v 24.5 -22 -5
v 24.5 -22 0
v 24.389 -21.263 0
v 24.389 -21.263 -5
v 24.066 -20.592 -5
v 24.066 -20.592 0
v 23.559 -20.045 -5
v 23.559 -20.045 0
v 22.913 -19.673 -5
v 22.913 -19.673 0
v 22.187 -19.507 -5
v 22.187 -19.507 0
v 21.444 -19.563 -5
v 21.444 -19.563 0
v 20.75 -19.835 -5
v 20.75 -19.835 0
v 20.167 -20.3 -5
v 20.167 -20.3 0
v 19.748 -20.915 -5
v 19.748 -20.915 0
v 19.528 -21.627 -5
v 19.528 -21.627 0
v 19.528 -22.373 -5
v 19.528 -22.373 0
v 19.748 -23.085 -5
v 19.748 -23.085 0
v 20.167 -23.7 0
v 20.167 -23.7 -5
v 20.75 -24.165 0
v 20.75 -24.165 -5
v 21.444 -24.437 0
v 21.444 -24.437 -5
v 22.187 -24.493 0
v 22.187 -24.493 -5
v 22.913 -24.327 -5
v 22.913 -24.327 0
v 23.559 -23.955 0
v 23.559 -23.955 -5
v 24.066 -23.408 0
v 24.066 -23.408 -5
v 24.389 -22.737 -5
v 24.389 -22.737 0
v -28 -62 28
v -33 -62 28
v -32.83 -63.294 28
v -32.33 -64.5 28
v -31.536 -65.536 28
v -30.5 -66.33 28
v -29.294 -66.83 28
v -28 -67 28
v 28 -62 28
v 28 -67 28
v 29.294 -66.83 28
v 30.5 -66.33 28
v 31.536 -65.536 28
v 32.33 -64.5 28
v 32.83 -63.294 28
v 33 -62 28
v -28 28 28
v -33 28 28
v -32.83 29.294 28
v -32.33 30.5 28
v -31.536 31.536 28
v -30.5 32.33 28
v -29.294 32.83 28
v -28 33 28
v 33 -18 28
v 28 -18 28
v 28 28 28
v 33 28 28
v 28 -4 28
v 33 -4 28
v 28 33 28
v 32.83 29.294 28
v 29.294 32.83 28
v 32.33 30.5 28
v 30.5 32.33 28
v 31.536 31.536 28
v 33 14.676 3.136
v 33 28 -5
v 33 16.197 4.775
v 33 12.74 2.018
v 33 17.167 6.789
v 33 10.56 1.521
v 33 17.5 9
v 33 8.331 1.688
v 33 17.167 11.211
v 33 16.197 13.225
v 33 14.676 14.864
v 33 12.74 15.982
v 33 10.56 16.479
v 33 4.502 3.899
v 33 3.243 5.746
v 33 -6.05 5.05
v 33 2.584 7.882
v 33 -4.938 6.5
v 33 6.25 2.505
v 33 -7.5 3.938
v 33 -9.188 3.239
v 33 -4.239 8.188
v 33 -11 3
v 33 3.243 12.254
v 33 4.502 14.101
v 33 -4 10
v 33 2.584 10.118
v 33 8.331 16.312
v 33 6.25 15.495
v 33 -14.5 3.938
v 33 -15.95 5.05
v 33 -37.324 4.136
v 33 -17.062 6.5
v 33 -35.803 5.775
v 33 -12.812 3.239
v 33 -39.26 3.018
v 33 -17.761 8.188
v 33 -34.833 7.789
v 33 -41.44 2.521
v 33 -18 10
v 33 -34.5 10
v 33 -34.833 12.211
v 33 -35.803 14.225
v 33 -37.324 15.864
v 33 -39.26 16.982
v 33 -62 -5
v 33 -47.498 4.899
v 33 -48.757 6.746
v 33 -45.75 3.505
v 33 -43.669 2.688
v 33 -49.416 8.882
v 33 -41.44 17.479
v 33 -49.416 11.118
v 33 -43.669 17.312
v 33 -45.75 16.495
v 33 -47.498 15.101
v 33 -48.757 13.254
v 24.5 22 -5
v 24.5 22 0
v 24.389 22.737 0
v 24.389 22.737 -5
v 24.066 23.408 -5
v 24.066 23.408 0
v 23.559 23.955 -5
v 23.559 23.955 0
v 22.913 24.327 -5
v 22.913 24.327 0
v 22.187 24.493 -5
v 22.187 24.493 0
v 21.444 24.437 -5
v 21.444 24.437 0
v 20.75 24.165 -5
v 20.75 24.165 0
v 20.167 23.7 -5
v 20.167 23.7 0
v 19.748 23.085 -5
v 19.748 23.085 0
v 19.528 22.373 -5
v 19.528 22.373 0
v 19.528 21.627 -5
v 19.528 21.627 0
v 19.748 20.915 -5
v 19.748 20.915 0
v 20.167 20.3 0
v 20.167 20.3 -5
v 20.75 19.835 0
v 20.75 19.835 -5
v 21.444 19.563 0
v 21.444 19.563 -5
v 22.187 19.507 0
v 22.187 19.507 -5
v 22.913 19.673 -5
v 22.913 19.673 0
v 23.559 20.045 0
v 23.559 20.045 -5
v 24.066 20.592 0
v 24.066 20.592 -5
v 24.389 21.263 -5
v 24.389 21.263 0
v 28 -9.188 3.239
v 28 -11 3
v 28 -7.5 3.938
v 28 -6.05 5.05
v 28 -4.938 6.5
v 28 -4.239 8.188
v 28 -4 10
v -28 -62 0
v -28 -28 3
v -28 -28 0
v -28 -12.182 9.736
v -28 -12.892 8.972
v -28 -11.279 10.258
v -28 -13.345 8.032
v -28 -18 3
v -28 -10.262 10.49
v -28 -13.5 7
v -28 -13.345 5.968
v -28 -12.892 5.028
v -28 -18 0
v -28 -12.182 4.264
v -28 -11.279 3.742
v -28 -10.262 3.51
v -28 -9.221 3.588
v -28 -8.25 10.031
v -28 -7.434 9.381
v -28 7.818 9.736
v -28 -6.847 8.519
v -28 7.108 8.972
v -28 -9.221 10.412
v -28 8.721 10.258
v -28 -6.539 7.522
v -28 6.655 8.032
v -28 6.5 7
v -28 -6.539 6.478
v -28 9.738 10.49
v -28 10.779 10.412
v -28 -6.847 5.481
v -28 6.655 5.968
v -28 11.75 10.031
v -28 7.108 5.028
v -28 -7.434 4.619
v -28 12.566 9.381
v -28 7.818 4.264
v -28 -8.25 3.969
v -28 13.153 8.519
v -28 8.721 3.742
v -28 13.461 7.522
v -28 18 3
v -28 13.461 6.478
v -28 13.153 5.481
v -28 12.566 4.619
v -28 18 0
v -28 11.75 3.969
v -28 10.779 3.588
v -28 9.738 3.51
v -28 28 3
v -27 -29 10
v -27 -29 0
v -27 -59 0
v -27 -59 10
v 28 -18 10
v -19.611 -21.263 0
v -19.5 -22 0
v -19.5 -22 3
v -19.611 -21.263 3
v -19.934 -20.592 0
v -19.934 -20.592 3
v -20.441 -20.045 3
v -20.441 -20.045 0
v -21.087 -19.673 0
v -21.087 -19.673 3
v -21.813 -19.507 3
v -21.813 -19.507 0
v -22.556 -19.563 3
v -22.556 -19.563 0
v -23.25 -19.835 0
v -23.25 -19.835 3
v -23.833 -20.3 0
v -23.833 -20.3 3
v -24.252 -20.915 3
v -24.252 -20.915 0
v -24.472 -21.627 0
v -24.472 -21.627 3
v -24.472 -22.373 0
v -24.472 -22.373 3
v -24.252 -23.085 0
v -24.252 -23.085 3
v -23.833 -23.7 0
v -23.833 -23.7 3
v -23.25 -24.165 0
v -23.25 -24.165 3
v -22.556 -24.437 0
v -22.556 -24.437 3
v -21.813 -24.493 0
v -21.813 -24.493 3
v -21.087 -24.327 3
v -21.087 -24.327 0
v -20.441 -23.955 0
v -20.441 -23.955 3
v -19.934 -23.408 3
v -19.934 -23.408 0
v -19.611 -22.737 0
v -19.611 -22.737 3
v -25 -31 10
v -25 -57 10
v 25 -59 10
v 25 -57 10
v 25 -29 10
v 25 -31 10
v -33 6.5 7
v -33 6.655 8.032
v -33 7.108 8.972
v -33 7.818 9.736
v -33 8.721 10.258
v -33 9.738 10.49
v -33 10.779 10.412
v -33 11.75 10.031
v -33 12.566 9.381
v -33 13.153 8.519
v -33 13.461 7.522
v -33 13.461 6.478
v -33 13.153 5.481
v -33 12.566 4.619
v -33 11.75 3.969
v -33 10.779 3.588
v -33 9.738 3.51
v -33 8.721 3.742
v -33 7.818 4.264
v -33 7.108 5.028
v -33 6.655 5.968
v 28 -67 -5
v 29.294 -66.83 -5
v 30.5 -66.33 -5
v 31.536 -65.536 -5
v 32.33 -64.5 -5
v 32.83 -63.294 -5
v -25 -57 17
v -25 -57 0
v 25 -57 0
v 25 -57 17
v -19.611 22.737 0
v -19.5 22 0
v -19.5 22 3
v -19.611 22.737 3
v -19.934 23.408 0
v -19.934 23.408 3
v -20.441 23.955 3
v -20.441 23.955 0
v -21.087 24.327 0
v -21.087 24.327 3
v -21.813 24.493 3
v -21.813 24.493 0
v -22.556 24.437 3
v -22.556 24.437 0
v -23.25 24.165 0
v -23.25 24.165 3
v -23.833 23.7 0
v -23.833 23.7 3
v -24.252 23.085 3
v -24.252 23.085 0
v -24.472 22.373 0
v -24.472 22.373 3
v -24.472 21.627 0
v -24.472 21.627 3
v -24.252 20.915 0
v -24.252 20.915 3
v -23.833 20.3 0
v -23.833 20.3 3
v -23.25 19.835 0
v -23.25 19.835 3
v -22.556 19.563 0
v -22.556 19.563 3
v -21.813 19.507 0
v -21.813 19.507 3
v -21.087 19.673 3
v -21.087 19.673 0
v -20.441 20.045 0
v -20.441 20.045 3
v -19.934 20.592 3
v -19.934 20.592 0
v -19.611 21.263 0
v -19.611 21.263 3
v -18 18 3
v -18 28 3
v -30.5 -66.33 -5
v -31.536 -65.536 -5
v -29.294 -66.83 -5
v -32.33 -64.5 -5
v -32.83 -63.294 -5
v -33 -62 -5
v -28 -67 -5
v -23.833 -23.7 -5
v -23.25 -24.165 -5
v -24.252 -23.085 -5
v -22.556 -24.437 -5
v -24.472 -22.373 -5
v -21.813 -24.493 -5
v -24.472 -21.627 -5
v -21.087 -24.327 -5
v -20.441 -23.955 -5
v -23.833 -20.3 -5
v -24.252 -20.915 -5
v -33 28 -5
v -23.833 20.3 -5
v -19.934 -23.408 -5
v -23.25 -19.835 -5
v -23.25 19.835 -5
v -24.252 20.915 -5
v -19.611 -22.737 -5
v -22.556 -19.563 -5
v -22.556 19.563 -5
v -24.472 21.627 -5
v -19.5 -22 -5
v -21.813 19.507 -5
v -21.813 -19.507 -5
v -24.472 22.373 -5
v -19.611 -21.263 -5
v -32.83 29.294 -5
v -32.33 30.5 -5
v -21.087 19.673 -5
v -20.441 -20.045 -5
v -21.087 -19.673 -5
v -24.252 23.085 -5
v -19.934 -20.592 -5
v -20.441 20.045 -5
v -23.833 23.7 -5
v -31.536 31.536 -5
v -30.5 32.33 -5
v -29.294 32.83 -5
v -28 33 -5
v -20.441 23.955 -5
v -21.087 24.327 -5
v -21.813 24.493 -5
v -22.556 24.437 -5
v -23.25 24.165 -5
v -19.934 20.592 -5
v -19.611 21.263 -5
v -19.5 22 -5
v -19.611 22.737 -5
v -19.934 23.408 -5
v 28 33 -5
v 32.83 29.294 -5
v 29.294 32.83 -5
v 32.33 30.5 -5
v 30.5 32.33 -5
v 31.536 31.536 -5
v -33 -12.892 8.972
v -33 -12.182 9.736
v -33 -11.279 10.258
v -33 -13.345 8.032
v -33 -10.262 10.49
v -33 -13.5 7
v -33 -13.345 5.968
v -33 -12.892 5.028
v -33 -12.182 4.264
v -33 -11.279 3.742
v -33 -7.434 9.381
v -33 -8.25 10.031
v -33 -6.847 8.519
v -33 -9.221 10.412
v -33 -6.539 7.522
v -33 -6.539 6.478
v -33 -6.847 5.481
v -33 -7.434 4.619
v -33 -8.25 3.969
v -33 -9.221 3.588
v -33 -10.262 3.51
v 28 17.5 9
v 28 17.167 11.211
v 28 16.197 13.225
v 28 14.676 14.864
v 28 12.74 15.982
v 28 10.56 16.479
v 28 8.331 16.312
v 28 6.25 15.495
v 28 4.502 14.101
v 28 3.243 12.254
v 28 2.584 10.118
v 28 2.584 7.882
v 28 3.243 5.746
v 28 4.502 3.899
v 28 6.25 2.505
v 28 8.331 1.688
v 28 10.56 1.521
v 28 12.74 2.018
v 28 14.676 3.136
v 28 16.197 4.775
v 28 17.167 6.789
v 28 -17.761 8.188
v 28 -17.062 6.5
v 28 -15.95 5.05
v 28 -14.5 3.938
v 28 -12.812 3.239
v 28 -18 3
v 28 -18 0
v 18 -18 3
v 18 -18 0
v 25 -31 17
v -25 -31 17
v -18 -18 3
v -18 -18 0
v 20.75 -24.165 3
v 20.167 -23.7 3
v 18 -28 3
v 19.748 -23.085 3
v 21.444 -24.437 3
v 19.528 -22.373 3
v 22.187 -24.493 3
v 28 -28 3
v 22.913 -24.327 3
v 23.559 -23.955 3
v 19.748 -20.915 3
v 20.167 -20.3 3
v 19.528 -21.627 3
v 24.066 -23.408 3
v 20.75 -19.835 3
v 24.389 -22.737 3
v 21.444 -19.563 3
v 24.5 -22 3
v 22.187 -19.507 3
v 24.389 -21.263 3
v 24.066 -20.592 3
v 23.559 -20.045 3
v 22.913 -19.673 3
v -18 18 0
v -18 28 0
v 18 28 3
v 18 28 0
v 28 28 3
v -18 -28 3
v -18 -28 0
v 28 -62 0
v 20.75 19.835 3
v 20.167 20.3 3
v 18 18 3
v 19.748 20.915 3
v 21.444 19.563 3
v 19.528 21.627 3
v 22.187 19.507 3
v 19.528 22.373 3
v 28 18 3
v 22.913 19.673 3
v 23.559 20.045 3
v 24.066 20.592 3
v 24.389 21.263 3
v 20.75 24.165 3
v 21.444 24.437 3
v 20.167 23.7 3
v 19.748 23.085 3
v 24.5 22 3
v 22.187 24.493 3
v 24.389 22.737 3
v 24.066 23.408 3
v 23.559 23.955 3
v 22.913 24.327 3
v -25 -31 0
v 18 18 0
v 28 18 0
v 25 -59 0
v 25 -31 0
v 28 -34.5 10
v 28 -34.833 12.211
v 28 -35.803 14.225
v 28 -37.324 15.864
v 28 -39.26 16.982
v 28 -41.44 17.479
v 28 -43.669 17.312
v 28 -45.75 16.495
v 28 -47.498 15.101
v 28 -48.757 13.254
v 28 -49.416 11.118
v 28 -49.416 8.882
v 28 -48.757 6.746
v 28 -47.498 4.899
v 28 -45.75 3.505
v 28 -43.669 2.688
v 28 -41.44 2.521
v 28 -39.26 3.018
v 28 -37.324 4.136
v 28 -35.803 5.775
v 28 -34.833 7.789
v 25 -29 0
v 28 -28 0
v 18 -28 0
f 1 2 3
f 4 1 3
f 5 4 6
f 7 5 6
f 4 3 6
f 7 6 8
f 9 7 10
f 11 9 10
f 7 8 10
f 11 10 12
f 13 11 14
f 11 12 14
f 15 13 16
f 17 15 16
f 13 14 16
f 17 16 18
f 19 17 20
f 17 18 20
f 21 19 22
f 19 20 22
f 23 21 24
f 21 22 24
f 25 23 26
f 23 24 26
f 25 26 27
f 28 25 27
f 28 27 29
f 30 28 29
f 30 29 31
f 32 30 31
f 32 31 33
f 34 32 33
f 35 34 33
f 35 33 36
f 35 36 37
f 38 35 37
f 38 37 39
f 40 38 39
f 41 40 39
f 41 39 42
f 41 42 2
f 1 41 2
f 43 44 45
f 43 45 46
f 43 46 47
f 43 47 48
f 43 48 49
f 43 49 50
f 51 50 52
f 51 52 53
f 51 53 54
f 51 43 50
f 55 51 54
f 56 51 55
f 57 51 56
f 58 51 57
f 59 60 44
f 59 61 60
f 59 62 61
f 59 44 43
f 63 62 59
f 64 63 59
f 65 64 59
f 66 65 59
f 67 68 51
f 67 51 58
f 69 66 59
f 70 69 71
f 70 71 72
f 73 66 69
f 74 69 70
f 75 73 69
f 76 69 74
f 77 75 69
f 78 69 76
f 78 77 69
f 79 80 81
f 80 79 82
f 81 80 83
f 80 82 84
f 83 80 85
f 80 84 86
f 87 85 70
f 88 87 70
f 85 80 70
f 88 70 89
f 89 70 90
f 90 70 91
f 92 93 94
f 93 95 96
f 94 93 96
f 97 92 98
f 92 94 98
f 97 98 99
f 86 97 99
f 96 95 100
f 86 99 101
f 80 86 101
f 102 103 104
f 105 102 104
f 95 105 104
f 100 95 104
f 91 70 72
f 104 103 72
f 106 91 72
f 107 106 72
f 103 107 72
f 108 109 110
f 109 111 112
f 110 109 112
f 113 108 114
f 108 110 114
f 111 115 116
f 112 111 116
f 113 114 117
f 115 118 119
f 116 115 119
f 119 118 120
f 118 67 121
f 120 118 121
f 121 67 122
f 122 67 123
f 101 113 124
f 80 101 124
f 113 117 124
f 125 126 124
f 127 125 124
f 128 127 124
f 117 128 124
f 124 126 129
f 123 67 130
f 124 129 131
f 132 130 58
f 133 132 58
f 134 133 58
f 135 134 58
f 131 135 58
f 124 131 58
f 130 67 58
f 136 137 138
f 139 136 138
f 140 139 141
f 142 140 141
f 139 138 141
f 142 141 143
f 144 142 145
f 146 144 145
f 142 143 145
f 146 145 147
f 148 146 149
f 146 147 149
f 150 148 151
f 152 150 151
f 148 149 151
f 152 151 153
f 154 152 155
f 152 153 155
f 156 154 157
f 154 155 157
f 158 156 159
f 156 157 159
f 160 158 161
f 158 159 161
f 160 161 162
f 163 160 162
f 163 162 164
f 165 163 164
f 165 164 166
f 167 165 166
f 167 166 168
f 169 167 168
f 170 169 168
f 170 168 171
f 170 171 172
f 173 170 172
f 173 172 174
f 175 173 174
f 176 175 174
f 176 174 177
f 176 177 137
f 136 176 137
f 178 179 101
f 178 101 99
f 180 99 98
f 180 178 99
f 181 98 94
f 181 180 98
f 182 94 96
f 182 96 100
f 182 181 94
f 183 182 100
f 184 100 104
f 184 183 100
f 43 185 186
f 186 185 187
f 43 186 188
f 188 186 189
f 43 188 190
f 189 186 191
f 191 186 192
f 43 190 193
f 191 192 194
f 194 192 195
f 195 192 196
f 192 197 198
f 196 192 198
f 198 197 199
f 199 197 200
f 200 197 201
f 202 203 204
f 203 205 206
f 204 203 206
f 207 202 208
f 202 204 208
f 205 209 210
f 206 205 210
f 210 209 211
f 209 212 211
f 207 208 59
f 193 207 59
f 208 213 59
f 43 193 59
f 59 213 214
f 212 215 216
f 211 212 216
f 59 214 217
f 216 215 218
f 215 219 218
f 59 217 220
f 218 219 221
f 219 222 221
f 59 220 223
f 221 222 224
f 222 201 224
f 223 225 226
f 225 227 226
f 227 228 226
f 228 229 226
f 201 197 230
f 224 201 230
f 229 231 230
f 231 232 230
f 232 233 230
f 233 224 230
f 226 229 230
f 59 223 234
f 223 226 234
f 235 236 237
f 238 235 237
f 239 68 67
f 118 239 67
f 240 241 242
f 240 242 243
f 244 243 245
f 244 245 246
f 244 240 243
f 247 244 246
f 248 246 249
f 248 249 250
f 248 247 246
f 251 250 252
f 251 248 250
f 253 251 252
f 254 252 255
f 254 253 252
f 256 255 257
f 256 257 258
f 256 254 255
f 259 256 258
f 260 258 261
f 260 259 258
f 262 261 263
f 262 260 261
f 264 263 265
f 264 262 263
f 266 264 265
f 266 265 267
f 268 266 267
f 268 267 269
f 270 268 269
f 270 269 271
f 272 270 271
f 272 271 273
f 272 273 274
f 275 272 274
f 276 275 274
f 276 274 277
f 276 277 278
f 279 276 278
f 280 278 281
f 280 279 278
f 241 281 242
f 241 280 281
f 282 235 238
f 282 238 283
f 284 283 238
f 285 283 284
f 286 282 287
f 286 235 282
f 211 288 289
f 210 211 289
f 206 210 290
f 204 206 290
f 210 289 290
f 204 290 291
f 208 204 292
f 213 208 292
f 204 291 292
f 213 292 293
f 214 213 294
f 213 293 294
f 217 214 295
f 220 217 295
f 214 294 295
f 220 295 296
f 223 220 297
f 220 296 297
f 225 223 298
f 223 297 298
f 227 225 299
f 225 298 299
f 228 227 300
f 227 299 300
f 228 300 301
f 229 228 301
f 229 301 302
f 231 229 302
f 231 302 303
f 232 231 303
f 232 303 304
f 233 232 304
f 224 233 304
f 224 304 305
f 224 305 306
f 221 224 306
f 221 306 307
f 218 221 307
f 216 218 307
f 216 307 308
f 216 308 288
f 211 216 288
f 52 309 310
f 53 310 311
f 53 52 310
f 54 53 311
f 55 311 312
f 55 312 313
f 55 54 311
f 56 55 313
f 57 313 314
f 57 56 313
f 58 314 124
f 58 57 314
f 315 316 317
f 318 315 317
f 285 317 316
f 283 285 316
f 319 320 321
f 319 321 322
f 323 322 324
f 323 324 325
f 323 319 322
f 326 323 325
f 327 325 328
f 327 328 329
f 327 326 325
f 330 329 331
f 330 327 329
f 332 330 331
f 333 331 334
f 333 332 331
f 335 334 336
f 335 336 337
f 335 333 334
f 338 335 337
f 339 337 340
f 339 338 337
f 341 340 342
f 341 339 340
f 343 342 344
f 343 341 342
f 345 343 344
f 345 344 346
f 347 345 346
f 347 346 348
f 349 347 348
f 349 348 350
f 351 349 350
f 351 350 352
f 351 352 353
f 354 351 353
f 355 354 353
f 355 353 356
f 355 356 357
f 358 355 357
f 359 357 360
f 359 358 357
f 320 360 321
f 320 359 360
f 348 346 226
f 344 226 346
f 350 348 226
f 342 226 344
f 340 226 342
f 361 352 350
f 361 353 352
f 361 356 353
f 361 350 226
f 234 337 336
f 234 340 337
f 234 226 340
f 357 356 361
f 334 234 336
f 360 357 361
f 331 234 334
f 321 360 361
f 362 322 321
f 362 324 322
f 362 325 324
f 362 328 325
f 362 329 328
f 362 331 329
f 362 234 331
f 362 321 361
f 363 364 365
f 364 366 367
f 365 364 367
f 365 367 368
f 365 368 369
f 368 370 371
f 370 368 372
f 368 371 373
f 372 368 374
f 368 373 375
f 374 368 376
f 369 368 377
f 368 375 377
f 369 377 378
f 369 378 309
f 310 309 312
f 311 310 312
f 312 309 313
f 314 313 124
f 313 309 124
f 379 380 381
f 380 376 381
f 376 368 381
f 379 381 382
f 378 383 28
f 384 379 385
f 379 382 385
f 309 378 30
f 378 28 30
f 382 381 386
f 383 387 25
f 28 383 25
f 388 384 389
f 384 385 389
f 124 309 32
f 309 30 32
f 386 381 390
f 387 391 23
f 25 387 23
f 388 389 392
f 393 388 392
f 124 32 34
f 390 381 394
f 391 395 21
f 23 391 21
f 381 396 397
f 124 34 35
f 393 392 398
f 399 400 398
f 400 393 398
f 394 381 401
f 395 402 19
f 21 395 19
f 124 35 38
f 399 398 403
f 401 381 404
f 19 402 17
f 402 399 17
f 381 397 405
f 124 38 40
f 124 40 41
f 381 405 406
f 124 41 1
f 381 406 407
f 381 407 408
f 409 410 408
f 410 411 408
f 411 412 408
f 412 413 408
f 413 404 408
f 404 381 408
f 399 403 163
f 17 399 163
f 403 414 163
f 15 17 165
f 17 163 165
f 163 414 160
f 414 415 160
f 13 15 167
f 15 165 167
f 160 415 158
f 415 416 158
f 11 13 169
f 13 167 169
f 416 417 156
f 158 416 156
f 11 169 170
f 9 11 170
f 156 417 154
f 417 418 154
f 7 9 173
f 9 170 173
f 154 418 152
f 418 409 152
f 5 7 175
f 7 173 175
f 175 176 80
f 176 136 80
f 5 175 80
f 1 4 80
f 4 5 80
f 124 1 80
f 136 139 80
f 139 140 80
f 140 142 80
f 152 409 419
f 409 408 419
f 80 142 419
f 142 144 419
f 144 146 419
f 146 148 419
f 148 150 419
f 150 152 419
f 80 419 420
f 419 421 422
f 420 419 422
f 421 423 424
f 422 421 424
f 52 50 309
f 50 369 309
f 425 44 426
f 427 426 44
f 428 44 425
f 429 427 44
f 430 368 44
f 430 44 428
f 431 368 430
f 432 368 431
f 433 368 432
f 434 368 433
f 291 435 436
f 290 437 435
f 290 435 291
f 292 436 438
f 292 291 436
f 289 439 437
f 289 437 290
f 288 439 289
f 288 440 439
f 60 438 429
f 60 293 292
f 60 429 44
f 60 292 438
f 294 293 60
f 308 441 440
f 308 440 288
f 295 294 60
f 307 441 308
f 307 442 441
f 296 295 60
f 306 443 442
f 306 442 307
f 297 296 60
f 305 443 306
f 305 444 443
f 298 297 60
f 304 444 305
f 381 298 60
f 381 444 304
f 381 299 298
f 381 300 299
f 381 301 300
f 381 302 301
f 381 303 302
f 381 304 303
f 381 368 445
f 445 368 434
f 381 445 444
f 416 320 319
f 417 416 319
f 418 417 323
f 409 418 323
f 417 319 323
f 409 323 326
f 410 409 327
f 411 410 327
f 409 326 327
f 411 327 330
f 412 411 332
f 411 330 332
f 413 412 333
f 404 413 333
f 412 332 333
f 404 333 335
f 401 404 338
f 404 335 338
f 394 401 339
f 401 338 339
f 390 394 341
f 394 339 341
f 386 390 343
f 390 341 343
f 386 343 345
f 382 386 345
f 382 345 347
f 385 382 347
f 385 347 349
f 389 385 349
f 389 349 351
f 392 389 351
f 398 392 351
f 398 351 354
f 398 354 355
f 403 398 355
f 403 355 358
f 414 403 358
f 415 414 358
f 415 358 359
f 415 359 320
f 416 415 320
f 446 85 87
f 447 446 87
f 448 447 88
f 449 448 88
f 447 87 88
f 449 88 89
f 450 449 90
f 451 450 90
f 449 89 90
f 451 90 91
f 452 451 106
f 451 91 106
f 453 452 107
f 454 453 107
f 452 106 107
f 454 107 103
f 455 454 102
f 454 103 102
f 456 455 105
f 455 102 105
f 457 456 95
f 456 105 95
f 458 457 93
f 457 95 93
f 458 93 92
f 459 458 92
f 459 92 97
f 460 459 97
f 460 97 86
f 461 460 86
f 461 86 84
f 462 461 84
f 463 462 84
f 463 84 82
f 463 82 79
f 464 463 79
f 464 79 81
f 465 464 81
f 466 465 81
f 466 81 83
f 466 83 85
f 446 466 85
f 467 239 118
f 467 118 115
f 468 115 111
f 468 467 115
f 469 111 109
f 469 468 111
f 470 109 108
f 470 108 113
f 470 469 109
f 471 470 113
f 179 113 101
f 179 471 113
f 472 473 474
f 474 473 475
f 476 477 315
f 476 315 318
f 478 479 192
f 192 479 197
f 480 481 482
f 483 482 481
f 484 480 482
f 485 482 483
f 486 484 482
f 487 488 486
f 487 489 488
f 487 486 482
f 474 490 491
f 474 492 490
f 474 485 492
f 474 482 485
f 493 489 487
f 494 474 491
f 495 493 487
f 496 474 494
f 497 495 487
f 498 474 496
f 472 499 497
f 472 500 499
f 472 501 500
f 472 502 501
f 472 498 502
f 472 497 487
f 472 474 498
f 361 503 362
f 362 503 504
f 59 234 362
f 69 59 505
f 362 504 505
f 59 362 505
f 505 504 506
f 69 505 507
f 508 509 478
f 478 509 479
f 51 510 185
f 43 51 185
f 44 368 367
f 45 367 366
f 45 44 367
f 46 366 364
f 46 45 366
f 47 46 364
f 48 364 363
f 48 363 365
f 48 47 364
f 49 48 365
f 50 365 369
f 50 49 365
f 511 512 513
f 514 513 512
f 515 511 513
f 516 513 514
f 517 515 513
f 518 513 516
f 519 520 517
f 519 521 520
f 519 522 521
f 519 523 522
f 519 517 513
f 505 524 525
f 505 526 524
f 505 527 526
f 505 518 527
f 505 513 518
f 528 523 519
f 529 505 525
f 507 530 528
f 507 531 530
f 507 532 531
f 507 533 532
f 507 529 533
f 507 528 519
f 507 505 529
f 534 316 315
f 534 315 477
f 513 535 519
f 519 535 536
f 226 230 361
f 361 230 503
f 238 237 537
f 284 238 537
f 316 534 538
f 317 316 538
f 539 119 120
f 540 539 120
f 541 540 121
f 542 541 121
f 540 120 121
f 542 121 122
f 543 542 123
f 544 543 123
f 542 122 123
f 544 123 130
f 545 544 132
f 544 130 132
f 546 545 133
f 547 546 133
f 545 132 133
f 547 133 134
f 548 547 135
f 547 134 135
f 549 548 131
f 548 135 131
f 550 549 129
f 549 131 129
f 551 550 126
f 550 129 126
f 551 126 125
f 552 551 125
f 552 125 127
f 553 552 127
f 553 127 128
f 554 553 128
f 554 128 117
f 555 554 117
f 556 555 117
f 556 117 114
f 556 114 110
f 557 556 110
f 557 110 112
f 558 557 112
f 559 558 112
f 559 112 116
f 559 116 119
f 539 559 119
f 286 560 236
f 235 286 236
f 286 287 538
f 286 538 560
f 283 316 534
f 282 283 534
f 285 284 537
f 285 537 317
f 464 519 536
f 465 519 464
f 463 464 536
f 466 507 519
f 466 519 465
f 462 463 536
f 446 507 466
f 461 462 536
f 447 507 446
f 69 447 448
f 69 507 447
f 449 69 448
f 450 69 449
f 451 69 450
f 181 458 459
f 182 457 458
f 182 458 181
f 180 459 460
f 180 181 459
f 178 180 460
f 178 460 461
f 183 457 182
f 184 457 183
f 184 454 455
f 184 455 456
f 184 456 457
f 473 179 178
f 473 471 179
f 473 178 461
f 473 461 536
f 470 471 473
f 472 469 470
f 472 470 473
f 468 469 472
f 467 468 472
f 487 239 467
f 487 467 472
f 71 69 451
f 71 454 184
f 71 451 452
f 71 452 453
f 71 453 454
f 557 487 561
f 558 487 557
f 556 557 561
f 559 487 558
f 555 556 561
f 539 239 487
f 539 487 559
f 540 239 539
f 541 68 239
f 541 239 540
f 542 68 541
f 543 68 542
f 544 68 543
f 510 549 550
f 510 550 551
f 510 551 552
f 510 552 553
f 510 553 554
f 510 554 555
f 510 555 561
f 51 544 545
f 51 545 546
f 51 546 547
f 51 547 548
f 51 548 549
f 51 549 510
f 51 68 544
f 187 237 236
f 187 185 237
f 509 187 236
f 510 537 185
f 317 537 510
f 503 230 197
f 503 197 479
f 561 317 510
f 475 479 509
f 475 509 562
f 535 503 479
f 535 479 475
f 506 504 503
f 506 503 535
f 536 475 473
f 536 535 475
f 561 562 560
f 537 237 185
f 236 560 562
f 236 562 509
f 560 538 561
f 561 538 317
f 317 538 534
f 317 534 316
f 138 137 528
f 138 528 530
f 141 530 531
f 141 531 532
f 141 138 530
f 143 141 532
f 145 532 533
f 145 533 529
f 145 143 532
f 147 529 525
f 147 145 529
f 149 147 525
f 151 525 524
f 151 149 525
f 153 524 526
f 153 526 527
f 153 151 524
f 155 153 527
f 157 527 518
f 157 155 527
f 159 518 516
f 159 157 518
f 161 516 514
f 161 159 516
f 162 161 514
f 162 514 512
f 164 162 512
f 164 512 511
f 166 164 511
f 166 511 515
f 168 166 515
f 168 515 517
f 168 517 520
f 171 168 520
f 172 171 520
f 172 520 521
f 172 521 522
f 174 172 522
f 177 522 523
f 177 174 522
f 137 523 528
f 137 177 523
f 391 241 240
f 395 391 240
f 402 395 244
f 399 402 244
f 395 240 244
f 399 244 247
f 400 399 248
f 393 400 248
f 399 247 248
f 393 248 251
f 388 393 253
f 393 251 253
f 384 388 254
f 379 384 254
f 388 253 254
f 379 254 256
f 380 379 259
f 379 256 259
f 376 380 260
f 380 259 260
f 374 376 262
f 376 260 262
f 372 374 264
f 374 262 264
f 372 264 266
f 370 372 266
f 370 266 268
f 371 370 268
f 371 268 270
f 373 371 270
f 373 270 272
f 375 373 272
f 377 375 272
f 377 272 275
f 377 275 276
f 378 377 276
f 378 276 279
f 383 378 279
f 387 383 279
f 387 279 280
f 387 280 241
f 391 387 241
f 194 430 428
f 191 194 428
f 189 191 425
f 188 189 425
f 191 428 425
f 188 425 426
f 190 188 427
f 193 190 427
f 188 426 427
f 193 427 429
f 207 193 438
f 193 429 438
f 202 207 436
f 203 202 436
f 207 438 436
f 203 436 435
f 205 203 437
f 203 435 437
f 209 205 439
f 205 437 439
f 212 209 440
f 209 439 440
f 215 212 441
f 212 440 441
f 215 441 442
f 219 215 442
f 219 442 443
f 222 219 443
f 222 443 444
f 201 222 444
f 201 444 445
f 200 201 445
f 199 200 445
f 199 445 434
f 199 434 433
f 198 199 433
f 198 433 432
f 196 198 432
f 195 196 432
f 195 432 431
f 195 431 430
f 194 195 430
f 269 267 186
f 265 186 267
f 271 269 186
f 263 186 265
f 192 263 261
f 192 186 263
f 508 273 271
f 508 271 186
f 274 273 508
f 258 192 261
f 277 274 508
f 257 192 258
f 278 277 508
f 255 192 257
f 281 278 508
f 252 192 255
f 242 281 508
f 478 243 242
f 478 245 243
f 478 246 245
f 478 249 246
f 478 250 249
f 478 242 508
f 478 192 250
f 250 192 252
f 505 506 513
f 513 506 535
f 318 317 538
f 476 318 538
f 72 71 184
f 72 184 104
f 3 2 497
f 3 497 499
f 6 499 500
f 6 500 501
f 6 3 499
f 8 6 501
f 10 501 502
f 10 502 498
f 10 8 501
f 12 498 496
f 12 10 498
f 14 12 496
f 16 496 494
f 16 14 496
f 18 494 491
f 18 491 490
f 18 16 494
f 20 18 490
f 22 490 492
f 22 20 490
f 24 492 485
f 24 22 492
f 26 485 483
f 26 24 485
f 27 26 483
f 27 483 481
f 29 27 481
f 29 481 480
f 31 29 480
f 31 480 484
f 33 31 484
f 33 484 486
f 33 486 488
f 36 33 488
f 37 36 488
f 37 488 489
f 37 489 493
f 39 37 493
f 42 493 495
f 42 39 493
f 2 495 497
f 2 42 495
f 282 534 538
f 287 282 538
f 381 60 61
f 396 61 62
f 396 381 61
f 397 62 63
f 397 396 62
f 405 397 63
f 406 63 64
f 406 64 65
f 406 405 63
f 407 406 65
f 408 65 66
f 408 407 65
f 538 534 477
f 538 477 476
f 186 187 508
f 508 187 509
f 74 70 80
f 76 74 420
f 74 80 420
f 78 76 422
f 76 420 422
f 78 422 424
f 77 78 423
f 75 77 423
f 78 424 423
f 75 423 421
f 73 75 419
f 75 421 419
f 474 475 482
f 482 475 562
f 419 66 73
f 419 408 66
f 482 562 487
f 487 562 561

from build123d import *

# Parameters (mm, degrees)
F0_W         = 66
F0_H         = 100
F0_W_2       = 50
F0_H_2       = 26
F0_W_3       = 15
F0_H_3       = 12
F0_W_4       = 14
F0_H_4       = 10
F0_W_5       = 36
F0_H_5       = 2
F0_W_6       = 8
F0_H_6       = 8
F0_R         = 2.5
F1_DEPTH     = 5
F2_DEPTH     = 28
F3_DEPTH     = 3
F5_DEPTH     = 17
F6_R         = 5
F7_DEPTH     = 25
F8_R         = 7.5
F9_DEPTH     = 25
F10_DEPTH    = 10
F4_W         = 5
F4_H         = 14
F11_DEPTH    = 25
F12_T1_DEPTH = 5
F13_R        = 3.5
F14_DEPTH    = 25


# Not quite as in the source:
# - a fillet or chamfer that OpenCascade refuses, or shapes differently, is made with other operations: its cross-section is extruded or revolved along the edge and cut away or added


with BuildPart() as f1:
    # F0 (on Top) → F1 (new body)
    with BuildSketch(Plane.XY):
        with Locations((0, -17)):
            Rectangle(F0_W, F0_H)
        Polygon((-18, 28), (18, 28), (28, 28), (28, 18), (28, -18), (28, -28), (28, -62), (-28, -62), (-28, -28), (-28, -18), (-28, 18), (-28, 28), align=None, mode=Mode.SUBTRACT)
        Polygon((28, -62), (28, -28), (18, -28), (-18, -28), (-28, -28), (-28, -62), align=None)
        Polygon((25, -31), (25, -57), (25, -59), (-27, -59), (-27, -29), (25, -29), align=None, mode=Mode.SUBTRACT)
        Polygon((18, 18), (18, 26), (-18, 26), (-18, 18), (-26, 18), (-26, 16), (-11, 16), (-11, 4), (-26, 4), (-26, -4), (-11, -4), (-11, -16), (-26, -16), (-26, -18), (-18, -18), (-18, -26), (18, -26), (18, -18), (13, -18), (13, -4), (26, -4), (26, 5), (12, 5), (12, 15), (26, 15), (26, 18), align=None)
        Polygon((-4, 9), (1, 9), (1, 4), (1, -1), (-4, -1), (-9, -1), (-9, 4), (-9, 9), align=None, mode=Mode.SUBTRACT)
        with Locations((0, -44)):
            Rectangle(F0_W_2, F0_H_2)
        Polygon((25, -59), (25, -57), (-25, -57), (-25, -31), (25, -31), (25, -29), (-27, -29), (-27, -59), align=None)
        Polygon((26, -18), (26, -4), (13, -4), (13, -18), (18, -18), align=None)
        with Locations((-18.5, -10)):
            Rectangle(F0_W_3, F0_H_3)
        with Locations((-18.5, 10)):
            Rectangle(F0_W_3, F0_H_3)
        with Locations((19, 10)):
            Rectangle(F0_W_4, F0_H_4)
        with BuildLine():
            ThreePointArc((1, 4), (-0.4644660941, 7.5355339059), (-4, 9))
            ThreePointArc((-4, 9), (-7.5355339059, 7.5355339059), (-9, 4))
            ThreePointArc((-9, 4), (-7.5355339059, 0.4644660941), (-4, -1))
            ThreePointArc((-4, -1), (-0.4644660941, 0.4644660941), (1, 4))
        make_face()
        with Locations((0, 27)):
            Rectangle(F0_W_5, F0_H_5)
        Polygon((28, 18), (26, 18), (26, 15), (26, 5), (26, -4), (26, -18), (28, -18), align=None)
        with Locations((0, -27)):
            Rectangle(F0_W_5, F0_H_5)
        Polygon((-26, 16), (-26, 18), (-28, 18), (-28, -18), (-26, -18), (-26, -16), (-26, -4), (-26, 4), align=None)
        with Locations((-22, 22)):
            Rectangle(F0_W_6, F0_H_6)
        with Locations((-22, 22)):
            Circle(F0_R, mode=Mode.SUBTRACT)
        with Locations((22, 22)):
            Rectangle(F0_W_6, F0_H_6)
        with Locations((22, 22)):
            Circle(F0_R, mode=Mode.SUBTRACT)
        with Locations((22, -22)):
            Rectangle(F0_W_6, F0_H_6)
        with Locations((22, -22)):
            Circle(F0_R, mode=Mode.SUBTRACT)
        with Locations((-22, -22)):
            Rectangle(F0_W_6, F0_H_6)
        with Locations((-22, -22)):
            Circle(F0_R, mode=Mode.SUBTRACT)
        Polygon((-26, 26), (-18, 26), (-18, 28), (-28, 28), (-28, 18), (-26, 18), align=None)
        Polygon((18, 26), (26, 26), (26, 18), (28, 18), (28, 28), (18, 28), align=None)
        Polygon((28, -28), (28, -18), (26, -18), (26, -26), (18, -26), (18, -28), align=None)
        Polygon((-26, -18), (-28, -18), (-28, -28), (-18, -28), (-18, -26), (-26, -26), align=None)
        with Locations((-22, 22)):
            Circle(F0_R)
        with Locations((-22, -22)):
            Circle(F0_R)
        with Locations((22, 22)):
            Circle(F0_R)
        with Locations((22, -22)):
            Circle(F0_R)
        with BuildLine():
            ThreePointArc((-4, -1), (-7.5355339059, 0.4644660941), (-9, 4))
            Line((-9, 4), (-9, -1))
            Line((-9, -1), (-4, -1))
        make_face()
        with BuildLine():
            Line((1, 4), (1, 9))
            Line((1, 9), (-4, 9))
            ThreePointArc((-4, 9), (-0.4644660941, 7.5355339059), (1, 4))
        make_face()
        with BuildLine():
            ThreePointArc((-9, 4), (-7.5355339059, 7.5355339059), (-4, 9))
            Line((-4, 9), (-9, 9))
            Line((-9, 9), (-9, 4))
        make_face()
        with BuildLine():
            Line((1, -1), (1, 4))
            ThreePointArc((1, 4), (-0.4644660941, 0.4644660941), (-4, -1))
            Line((-4, -1), (1, -1))
        make_face()
    extrude(amount=-F1_DEPTH)

    # F0 (on Top) → F2 (join)
    with BuildSketch(Plane.XY):
        with Locations((0, -17)):
            Rectangle(F0_W, F0_H)
        Polygon((-18, 28), (18, 28), (28, 28), (28, 18), (28, -18), (28, -28), (28, -62), (-28, -62), (-28, -28), (-28, -18), (-28, 18), (-28, 28), align=None, mode=Mode.SUBTRACT)
    extrude(amount=F2_DEPTH)

    # F0 (on Top) → F3 (join)
    with BuildSketch(Plane.XY):
        with Locations((-22, 22)):
            Rectangle(F0_W_6, F0_H_6)
        with Locations((-22, 22)):
            Circle(F0_R, mode=Mode.SUBTRACT)
        Polygon((-26, 26), (-18, 26), (-18, 28), (-28, 28), (-28, 18), (-26, 18), align=None)
        Polygon((18, 26), (26, 26), (26, 18), (28, 18), (28, 28), (18, 28), align=None)
        with Locations((22, 22)):
            Rectangle(F0_W_6, F0_H_6)
        with Locations((22, 22)):
            Circle(F0_R, mode=Mode.SUBTRACT)
        Polygon((-26, -18), (-28, -18), (-28, -28), (-18, -28), (-18, -26), (-26, -26), align=None)
        with Locations((-22, -22)):
            Rectangle(F0_W_6, F0_H_6)
        with Locations((-22, -22)):
            Circle(F0_R, mode=Mode.SUBTRACT)
        Polygon((28, -28), (28, -18), (26, -18), (26, -26), (18, -26), (18, -28), align=None)
        with Locations((22, -22)):
            Rectangle(F0_W_6, F0_H_6)
        with Locations((22, -22)):
            Circle(F0_R, mode=Mode.SUBTRACT)
    extrude(amount=F3_DEPTH)

    # F6
    f6_edges = [f1.edges().sort_by_distance(p)[0] for p in [
        (-33, 33, 11.5),
        (-33, -67, 11.5),
        (33, -67, 11.5),
        (33, 33, 11.5),
    ]]
    fillet(f6_edges, radius=F6_R)

    # F0 (on Top) → F7 (cut)
    with BuildSketch(Plane.XY):
        with Locations((22, 22)):
            Circle(F0_R)
        with Locations((22, -22)):
            Circle(F0_R)
        with Locations((-22, -22)):
            Circle(F0_R)
        with Locations((-22, 22)):
            Circle(F0_R)
    extrude(amount=-F7_DEPTH, mode=Mode.SUBTRACT)

    # F8 (on face) → F9 (cut)
    with BuildSketch(Plane.YZ.offset(33)):
        with Locations((-42, 10)):
            Circle(F8_R)
        with Locations((10, 9)):
            Circle(F8_R)
    extrude(amount=-F9_DEPTH, mode=Mode.SUBTRACT)

    # F0 (on Top) → F10 (join)
    with BuildSketch(Plane.XY):
        Polygon((25, -59), (25, -57), (-25, -57), (-25, -31), (25, -31), (25, -29), (-27, -29), (-27, -59), align=None)
    extrude(amount=F10_DEPTH)

    # F4 (on face) → F11 (cut)
    with BuildSketch(Plane.XY.offset(28)):
        with Locations((30.5, -11)):
            Rectangle(F4_W, F4_H)
    extrude(amount=-F11_DEPTH, mode=Mode.SUBTRACT)

    # F12: fillet of radius 7 on 2 edges, made by hand

    # F12_s2 → F12_t1 (join)
    with BuildSketch(Plane.YZ.offset(28)):
        with BuildLine():
            ThreePointArc((-11, 3), (-6.0502525317, 5.0502525317), (-4, 10))
            Line((-4, 10), (-4, 3))
            Line((-4, 3), (-11, 3))
        make_face()
        with BuildLine():
            ThreePointArc((-18, 10), (-15.9497474683, 5.0502525317), (-11, 3))
            Line((-11, 3), (-18, 3))
            Line((-18, 3), (-18, 10))
        make_face()
    extrude(amount=F12_T1_DEPTH)

    # F13 (on face) → F14 (cut)
    with BuildSketch(Plane(origin=(-33, 0, 0), x_dir=(0, -1, 0), z_dir=(-1, 0, 0))):
        with Locations((-10, 7)):
            Circle(F13_R)
        with Locations((10, 7)):
            Circle(F13_R)
    extrude(amount=-F14_DEPTH, mode=Mode.SUBTRACT)


with BuildPart() as f5:
    # F0 (on Top) → F5 (new body)
    with BuildSketch(Plane.XY):
        with Locations((0, -44)):
            Rectangle(F0_W_2, F0_H_2)
    extrude(amount=F5_DEPTH)


solid = Compound([f1.part, f5.part])
